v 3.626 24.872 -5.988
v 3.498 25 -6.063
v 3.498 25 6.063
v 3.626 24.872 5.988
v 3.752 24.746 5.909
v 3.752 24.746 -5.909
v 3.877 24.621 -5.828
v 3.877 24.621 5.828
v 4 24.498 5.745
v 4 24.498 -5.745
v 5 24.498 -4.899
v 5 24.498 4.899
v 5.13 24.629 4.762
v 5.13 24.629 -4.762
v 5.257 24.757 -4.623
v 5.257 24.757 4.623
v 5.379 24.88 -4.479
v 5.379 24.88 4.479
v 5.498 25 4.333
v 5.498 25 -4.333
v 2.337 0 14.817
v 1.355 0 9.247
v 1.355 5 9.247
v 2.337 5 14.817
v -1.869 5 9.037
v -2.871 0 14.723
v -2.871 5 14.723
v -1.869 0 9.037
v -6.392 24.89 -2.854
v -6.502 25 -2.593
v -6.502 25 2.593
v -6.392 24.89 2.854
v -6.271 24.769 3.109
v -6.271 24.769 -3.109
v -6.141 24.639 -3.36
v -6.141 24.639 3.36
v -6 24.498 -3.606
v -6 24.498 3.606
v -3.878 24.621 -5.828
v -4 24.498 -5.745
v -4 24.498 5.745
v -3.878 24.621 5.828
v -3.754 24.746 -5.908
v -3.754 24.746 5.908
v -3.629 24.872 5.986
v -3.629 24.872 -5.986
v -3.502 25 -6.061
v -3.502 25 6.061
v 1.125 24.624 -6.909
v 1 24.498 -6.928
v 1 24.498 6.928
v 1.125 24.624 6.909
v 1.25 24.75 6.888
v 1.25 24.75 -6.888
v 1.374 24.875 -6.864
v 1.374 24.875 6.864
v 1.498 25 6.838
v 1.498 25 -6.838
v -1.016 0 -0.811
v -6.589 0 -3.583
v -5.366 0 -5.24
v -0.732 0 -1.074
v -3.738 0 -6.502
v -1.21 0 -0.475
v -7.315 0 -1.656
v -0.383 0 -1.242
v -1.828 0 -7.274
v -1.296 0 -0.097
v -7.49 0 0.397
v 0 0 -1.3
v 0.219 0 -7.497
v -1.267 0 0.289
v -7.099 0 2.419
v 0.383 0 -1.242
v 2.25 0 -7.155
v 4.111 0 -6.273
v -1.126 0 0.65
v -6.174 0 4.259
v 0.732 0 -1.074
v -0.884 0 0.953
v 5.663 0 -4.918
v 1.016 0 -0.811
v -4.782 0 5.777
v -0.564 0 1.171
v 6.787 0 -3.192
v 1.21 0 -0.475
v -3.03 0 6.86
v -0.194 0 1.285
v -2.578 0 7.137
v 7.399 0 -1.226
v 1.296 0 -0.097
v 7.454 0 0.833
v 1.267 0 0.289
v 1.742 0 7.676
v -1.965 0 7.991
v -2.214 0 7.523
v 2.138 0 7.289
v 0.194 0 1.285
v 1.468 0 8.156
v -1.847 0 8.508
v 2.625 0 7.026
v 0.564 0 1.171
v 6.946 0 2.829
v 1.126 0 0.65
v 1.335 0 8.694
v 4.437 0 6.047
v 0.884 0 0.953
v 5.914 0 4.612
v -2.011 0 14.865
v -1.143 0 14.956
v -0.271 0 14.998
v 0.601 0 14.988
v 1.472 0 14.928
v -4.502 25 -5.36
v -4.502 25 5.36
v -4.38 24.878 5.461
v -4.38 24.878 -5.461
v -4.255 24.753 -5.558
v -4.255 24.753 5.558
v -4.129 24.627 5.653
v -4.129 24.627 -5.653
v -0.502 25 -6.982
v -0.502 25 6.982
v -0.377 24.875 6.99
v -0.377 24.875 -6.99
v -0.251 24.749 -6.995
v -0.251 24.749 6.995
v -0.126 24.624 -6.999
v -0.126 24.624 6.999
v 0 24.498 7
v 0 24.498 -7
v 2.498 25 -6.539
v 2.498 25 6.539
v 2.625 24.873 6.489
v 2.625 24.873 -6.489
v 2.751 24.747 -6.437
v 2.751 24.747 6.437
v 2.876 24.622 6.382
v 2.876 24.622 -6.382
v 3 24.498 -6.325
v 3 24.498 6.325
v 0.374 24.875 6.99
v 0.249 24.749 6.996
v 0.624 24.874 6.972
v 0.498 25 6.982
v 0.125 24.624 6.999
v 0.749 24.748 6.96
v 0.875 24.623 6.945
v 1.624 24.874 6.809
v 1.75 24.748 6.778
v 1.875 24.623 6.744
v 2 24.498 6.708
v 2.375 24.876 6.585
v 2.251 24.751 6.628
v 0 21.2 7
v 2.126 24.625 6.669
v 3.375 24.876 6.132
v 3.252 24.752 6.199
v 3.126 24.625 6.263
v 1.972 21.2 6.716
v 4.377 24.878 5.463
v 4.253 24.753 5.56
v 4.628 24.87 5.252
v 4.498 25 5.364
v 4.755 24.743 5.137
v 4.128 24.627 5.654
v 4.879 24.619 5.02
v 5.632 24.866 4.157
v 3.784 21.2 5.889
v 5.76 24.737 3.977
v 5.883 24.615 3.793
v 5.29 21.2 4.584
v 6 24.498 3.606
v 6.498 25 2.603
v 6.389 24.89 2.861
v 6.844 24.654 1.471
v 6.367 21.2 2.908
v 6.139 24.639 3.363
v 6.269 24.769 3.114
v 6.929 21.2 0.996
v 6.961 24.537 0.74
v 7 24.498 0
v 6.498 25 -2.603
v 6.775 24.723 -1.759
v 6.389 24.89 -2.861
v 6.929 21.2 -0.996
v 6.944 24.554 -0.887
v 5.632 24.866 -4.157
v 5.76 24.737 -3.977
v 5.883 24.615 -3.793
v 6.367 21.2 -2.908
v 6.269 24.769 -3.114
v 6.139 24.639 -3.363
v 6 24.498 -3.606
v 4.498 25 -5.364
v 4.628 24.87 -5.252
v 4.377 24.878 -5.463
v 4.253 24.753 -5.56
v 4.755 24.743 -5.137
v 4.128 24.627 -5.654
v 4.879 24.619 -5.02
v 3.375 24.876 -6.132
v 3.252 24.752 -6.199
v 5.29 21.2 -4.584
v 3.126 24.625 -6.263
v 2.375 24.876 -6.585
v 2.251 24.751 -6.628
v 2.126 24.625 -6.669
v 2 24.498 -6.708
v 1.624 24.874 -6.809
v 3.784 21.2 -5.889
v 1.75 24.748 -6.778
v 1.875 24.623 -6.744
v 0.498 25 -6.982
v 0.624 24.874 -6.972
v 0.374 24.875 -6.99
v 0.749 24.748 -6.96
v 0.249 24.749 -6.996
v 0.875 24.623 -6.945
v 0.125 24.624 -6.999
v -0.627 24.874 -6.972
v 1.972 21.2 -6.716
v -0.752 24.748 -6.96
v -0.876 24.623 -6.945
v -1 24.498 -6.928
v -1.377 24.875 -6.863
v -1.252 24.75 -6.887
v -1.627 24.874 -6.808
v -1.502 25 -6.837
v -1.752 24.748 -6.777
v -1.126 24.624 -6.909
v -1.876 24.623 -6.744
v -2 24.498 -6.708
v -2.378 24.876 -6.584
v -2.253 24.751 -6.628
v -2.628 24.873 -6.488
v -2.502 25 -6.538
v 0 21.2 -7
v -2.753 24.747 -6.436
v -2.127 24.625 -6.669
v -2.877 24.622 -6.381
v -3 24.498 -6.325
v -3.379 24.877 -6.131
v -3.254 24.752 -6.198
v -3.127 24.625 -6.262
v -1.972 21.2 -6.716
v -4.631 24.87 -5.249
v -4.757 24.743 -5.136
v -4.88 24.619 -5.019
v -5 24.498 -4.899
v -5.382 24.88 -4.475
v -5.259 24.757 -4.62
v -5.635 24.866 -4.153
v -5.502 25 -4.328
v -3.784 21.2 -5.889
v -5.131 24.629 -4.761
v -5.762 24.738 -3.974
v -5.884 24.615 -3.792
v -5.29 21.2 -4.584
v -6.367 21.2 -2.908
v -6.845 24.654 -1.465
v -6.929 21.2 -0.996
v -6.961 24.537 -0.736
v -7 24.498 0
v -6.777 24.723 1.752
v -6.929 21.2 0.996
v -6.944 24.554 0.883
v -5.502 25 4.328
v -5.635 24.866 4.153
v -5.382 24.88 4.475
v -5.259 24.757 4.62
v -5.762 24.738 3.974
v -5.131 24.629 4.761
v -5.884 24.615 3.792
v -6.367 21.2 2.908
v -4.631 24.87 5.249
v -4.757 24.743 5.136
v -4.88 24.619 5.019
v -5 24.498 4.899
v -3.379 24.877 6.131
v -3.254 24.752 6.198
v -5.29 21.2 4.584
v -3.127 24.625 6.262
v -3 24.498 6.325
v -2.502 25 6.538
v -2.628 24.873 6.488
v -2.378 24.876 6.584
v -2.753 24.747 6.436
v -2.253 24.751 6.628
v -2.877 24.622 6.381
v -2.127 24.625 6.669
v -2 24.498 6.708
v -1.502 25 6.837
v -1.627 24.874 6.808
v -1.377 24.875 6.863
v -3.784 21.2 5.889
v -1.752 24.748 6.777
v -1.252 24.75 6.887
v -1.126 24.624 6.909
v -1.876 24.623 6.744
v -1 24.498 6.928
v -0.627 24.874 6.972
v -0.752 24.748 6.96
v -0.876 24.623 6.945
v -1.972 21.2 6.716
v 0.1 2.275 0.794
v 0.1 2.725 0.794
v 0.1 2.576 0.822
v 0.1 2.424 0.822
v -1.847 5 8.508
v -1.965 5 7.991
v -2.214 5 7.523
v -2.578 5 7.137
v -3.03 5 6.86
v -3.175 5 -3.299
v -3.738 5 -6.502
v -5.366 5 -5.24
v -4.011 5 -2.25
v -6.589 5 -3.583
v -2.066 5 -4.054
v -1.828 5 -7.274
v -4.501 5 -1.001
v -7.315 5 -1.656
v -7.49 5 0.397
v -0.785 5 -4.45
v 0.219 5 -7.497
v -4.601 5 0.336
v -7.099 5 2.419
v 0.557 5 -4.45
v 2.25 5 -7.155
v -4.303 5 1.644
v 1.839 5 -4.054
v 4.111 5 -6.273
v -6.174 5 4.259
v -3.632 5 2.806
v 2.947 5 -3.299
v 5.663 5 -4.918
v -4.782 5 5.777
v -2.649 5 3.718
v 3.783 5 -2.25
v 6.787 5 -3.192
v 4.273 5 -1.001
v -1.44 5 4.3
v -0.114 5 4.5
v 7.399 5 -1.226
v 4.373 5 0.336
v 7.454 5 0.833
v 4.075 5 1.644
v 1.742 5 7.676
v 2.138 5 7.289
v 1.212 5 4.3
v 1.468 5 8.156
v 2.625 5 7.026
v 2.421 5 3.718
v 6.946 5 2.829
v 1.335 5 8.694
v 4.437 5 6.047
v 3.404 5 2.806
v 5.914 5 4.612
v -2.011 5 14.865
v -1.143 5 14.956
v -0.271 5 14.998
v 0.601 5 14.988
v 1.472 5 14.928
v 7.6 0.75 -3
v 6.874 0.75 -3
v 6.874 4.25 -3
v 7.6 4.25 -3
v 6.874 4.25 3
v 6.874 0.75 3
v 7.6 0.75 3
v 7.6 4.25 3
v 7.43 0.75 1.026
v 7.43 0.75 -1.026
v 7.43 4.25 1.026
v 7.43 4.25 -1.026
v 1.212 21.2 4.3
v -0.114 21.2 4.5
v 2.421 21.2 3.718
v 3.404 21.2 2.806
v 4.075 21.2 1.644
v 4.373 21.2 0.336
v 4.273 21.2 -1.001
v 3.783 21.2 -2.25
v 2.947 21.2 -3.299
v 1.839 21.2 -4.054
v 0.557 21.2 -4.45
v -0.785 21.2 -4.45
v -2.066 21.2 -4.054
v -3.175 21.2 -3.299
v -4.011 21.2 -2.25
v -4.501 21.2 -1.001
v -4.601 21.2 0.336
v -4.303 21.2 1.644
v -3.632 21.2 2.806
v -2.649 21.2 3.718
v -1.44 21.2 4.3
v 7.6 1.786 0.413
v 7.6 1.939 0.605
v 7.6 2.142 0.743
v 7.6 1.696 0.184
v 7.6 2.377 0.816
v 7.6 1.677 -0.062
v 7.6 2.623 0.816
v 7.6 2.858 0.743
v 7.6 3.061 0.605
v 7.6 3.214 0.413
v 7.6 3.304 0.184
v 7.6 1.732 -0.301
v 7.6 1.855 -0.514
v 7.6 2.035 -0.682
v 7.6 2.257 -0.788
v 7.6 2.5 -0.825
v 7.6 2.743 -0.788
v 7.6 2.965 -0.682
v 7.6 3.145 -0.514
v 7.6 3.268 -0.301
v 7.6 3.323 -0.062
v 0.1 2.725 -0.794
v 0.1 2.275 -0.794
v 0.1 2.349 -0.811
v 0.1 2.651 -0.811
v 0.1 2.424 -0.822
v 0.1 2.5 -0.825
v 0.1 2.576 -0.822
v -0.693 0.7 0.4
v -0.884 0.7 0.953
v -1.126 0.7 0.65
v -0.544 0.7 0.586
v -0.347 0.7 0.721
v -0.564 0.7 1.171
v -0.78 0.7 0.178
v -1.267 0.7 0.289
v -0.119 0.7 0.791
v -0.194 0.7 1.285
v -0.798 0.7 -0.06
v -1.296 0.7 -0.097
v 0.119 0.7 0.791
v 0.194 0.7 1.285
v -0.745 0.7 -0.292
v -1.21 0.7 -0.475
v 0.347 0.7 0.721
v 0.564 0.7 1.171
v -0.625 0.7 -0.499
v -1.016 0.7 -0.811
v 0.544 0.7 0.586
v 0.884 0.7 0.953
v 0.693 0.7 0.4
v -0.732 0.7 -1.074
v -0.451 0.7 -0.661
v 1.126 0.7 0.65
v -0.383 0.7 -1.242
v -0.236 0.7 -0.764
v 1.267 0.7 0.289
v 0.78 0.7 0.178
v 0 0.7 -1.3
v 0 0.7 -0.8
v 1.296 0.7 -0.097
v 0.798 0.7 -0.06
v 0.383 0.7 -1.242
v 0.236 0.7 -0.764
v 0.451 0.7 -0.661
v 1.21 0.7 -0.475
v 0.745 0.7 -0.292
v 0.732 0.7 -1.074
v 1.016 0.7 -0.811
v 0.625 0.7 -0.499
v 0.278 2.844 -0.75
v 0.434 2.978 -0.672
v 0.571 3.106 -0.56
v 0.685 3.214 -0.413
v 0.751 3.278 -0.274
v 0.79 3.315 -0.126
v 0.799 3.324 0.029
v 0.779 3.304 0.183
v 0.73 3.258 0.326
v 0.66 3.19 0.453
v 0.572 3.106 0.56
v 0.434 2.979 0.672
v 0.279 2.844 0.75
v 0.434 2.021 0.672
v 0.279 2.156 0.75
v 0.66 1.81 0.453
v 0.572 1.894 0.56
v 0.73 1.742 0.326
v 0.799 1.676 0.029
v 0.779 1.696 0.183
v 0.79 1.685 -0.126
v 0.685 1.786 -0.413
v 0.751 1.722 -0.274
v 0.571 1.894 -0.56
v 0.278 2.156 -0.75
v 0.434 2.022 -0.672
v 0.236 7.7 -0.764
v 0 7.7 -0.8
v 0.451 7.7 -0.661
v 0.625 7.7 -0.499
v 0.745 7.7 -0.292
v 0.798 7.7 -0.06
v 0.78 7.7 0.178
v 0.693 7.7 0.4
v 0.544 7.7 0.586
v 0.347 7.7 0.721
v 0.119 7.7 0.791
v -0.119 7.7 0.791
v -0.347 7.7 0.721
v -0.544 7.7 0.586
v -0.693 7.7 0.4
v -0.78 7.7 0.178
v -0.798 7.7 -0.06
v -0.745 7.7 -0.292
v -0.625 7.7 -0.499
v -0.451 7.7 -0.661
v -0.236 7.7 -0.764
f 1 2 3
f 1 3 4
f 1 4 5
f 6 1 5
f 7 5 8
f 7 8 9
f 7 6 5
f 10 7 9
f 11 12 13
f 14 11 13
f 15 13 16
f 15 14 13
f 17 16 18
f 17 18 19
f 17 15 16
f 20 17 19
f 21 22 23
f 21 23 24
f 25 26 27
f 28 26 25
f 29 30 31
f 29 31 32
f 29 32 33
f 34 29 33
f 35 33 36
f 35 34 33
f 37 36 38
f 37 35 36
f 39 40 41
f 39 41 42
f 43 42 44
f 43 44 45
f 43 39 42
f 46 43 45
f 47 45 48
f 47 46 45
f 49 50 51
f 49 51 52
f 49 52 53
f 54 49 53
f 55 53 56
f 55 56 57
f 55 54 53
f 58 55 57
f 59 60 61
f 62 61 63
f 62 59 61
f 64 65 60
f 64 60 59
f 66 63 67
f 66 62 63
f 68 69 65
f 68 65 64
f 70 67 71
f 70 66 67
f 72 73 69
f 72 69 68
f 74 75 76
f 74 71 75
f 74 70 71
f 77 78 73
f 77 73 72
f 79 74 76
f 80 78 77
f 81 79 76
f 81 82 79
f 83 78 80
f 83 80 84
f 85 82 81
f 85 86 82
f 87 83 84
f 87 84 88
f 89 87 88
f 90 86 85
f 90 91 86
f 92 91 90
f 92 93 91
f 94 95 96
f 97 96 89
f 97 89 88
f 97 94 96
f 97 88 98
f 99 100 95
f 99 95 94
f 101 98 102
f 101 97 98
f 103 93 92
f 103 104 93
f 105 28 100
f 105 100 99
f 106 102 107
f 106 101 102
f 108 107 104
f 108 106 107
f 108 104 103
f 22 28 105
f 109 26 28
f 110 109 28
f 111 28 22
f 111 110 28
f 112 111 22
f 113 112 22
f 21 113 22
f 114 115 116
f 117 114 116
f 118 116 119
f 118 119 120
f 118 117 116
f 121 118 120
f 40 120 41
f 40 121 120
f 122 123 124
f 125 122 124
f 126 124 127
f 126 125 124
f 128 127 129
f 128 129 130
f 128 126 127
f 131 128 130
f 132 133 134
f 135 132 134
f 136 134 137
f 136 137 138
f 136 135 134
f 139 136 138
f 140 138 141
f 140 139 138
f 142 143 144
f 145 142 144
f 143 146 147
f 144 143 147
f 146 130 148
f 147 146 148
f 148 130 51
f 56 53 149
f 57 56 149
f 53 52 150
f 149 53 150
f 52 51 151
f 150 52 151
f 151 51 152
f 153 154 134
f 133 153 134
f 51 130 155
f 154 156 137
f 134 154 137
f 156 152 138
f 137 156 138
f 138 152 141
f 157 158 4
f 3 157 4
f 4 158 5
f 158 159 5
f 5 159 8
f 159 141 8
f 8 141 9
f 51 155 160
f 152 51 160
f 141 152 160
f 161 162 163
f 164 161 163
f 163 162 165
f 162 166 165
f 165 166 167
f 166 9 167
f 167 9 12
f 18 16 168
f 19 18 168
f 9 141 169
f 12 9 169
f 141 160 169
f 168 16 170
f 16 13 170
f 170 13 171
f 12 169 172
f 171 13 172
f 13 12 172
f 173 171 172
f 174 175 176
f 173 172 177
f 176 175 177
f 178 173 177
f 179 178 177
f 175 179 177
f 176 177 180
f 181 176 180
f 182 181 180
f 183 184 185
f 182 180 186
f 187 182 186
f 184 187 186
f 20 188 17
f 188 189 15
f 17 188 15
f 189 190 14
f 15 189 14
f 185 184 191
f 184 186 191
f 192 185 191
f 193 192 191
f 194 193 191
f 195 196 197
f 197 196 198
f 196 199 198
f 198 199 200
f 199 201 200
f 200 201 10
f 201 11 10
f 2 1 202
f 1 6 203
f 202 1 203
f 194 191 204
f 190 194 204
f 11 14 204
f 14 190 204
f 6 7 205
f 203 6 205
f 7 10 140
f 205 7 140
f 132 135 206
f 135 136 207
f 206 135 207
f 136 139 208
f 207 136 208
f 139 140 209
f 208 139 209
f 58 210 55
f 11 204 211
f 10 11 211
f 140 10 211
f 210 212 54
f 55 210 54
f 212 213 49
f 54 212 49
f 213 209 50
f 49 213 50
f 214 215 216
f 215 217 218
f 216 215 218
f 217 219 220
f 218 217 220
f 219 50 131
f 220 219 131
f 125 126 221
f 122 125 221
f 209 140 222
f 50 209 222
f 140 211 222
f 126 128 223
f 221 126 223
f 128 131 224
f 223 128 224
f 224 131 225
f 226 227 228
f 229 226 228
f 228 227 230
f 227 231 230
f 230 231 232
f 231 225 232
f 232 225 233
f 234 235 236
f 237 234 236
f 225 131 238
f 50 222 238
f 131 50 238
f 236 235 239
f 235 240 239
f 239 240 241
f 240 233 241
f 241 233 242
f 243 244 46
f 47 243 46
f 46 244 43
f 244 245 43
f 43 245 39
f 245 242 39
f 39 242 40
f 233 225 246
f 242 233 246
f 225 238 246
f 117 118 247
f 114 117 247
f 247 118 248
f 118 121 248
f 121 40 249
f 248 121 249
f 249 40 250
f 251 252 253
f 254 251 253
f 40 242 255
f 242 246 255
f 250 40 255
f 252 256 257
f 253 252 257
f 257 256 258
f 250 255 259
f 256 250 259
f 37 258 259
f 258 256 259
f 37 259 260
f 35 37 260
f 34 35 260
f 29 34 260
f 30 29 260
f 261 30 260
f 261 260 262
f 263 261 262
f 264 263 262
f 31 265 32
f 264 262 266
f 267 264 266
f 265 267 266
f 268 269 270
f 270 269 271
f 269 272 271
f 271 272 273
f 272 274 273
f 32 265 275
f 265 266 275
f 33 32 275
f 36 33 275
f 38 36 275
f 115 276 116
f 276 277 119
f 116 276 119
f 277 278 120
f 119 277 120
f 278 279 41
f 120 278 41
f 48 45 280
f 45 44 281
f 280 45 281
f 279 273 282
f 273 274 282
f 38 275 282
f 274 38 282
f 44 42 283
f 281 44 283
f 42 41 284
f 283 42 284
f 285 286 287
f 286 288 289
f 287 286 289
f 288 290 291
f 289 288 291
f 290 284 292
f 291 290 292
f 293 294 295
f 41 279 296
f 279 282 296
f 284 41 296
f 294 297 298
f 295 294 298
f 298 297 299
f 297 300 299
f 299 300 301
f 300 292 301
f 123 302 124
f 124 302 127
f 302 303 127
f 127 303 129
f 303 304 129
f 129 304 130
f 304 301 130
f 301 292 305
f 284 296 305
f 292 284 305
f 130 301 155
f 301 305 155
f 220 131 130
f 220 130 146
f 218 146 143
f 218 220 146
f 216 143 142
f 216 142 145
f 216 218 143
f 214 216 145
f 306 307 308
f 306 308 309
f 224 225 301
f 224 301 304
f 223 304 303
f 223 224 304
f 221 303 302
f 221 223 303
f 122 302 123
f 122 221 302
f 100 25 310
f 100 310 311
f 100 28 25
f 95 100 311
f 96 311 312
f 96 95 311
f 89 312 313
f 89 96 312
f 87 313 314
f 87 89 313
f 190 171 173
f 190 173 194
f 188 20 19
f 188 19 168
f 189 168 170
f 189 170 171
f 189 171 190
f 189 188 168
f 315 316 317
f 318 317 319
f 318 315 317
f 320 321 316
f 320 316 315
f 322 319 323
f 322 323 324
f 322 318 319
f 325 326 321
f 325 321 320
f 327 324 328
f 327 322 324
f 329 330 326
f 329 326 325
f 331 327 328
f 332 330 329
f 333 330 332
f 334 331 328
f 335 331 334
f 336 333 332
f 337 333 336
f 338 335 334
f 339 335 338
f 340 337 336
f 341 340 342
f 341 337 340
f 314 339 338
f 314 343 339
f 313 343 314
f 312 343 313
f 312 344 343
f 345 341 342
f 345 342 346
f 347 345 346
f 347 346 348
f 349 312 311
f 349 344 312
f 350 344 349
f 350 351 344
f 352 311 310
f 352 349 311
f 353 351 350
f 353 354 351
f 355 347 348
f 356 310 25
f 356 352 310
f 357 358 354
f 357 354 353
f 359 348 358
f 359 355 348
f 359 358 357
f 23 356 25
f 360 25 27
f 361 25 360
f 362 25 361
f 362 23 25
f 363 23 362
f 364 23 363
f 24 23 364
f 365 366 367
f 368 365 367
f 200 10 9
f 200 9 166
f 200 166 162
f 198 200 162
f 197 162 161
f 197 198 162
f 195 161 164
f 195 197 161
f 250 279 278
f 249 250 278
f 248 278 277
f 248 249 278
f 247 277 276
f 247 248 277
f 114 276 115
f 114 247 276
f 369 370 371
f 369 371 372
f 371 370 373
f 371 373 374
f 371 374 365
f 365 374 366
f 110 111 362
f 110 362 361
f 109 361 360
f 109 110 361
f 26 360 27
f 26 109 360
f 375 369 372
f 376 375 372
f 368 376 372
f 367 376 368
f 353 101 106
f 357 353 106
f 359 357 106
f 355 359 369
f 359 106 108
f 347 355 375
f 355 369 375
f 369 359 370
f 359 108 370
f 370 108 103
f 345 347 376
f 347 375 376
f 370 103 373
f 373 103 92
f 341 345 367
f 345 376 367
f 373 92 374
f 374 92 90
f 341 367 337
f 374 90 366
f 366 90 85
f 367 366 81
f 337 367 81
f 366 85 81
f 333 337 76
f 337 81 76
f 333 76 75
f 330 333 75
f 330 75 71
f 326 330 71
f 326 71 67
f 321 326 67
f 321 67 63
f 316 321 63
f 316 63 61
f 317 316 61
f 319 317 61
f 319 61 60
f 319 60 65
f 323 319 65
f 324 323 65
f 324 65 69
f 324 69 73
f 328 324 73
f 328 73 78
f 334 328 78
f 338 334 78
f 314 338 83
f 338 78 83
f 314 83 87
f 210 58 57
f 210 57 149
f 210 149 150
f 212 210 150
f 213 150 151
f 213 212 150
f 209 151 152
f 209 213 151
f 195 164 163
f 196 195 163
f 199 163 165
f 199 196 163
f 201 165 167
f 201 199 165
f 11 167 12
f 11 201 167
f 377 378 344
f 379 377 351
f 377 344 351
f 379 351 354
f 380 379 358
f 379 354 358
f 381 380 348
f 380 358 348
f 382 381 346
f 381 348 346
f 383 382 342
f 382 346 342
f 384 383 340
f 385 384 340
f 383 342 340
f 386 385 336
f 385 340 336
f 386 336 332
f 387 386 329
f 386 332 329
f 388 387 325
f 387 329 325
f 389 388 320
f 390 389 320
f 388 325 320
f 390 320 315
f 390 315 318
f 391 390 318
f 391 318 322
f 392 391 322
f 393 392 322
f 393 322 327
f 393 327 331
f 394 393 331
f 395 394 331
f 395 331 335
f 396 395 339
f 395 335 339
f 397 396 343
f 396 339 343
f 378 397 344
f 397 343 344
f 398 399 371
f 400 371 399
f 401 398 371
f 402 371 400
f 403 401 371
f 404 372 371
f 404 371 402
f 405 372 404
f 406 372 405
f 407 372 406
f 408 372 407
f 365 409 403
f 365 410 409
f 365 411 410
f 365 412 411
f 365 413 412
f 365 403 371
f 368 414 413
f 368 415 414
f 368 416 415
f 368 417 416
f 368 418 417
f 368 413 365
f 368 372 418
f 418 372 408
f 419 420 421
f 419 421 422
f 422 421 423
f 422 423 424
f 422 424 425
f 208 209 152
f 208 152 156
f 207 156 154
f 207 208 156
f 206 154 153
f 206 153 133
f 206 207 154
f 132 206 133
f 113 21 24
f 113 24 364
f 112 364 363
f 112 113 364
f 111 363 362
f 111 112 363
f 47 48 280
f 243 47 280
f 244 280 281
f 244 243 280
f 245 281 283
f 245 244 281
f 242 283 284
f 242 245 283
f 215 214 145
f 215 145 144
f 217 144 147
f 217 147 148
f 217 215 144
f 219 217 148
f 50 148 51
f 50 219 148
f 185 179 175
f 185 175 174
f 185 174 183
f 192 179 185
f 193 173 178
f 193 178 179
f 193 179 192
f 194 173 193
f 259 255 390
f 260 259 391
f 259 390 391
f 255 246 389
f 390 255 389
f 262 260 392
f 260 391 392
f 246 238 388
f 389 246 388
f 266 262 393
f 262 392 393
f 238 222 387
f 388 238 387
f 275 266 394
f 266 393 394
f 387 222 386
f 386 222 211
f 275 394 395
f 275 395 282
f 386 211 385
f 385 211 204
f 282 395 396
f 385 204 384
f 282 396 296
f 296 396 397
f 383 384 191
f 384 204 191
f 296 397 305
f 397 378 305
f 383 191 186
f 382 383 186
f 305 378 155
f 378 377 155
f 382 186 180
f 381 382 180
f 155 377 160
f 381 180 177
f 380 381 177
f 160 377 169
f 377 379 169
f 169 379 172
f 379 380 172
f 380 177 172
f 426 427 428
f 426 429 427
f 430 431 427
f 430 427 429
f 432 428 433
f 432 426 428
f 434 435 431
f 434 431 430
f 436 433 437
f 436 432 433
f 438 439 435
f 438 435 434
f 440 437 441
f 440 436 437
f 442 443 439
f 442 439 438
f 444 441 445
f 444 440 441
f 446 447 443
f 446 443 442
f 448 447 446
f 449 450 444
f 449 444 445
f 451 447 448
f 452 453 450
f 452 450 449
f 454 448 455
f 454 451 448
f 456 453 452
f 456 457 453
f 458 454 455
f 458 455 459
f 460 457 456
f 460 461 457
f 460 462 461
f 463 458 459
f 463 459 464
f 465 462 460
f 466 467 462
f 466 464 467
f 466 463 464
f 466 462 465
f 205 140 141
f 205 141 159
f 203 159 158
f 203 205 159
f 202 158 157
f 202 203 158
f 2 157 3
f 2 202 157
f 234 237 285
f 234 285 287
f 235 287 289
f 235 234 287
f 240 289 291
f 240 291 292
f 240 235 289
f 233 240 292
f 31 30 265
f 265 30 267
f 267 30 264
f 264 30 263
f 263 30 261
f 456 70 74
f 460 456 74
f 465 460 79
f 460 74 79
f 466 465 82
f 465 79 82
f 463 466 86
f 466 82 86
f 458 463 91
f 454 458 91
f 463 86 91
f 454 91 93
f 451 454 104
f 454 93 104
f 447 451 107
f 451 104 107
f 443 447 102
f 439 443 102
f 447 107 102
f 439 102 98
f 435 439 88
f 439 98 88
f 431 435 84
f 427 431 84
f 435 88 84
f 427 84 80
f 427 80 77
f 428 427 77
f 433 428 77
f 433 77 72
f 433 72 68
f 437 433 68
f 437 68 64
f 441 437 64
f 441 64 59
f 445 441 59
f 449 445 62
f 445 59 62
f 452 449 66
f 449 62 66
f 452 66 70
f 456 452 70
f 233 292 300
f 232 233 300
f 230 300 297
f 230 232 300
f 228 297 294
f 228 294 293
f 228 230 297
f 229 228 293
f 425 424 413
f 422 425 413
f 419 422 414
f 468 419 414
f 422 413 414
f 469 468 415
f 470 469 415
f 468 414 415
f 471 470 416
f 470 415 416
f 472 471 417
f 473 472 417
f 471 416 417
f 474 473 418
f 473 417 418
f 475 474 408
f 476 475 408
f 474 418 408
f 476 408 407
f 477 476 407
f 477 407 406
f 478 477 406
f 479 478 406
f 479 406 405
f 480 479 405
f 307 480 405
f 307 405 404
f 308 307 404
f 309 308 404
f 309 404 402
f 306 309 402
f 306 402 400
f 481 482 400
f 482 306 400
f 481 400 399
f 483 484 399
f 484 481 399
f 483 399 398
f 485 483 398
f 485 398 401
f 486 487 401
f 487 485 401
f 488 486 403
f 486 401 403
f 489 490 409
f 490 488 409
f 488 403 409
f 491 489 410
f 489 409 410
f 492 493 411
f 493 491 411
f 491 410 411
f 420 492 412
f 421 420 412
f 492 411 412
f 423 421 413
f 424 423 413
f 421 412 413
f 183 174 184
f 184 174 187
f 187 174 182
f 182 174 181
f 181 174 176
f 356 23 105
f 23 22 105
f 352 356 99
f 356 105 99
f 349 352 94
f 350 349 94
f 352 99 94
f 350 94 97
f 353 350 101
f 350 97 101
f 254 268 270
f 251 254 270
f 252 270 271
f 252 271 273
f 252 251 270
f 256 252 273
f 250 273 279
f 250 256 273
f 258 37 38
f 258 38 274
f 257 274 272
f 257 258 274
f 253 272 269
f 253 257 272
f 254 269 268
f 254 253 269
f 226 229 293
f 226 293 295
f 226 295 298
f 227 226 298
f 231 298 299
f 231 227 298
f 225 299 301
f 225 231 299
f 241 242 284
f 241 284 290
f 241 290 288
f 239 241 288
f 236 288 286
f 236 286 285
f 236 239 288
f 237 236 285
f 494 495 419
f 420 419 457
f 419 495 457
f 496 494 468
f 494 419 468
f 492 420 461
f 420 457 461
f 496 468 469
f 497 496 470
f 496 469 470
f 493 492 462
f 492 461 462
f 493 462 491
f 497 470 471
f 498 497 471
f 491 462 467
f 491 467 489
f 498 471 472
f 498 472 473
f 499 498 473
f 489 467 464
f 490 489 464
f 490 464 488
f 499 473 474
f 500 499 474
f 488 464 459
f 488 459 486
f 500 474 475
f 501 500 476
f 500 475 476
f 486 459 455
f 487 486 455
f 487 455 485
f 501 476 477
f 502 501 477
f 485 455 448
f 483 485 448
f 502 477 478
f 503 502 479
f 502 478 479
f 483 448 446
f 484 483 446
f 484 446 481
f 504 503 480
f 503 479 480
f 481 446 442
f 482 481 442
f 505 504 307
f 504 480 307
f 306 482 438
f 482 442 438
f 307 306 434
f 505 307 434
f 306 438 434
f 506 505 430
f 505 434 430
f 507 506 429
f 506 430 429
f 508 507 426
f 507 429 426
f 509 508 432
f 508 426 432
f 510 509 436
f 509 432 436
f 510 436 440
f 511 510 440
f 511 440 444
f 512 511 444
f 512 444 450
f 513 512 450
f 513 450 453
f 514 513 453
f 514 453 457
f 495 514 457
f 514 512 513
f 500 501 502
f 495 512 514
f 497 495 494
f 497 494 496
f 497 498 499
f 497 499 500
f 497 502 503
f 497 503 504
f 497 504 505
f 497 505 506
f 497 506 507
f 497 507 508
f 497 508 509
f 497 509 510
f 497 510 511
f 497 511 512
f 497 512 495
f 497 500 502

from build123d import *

# Parameters (mm, degrees)
SKETCH1_R                = 7.5
BOSS_EXTRUDE1_DEPTH      = 5
SKETCH2_R                = 7
BOSS_EXTRUDE2_DEPTH      = 20
CUT_EXTRUDE2_DEPTH       = 28.156951228
CUT_EXTRUDE2_DEPTH_BACK  = 28.156951228
SKETCH6_R                = 1.3
CUT_EXTRUDE3_DEPTH       = 0.7
SKETCH9_R                = 0.8
CUT_EXTRUDE4_DEPTH       = 7
BOSS_EXTRUDE3_DEPTH      = 0.1
BOSS_EXTRUDE3_DEPTH_BACK = 1
SKETCH10_W               = 6
SKETCH10_H               = 3.5
SKETCH17_R               = 7.5
SKETCH17_R_2             = 4.5
CUT_EXTRUDE7_DEPTH       = 16.2
BOSS_EXTRUDE6_DEPTH      = 5
FILLET2_R                = 2
SKETCH11_R               = 0.825
CUT_EXTRUDE8_DEPTH       = 7.5


with BuildPart() as part:
    # Sketch1 → Boss-Extrude1 (new body)
    with BuildSketch(Plane(origin=(0, 0, 0), x_dir=(1, 0, 0), z_dir=(0, 1, 0))):
        with Locations(Location((0, 0, 0), (0, 0, 270))):
            Circle(SKETCH1_R)
    extrude(amount=BOSS_EXTRUDE1_DEPTH)

    # Sketch2 → Boss-Extrude2 (add)
    with BuildSketch(Plane(origin=(0, 5, 0), x_dir=(1, 0, 0), z_dir=(0, 1, 0))):
        with Locations(Location((0, 0, 0), (0, 0, 270))):
            Circle(SKETCH2_R)
    extrude(amount=BOSS_EXTRUDE2_DEPTH)

    # Sketch5 → Cut-Extrude2 (cut, two sides: drawn at the far end of the back side and taken through both)
    with BuildSketch(Plane.XY.offset(-CUT_EXTRUDE2_DEPTH_BACK)):
        Polygon((-7.502045815, 25), (-7, 24.497954185), (-6.502045815, 25), (-6, 24.497954185), (-5.502045815, 25), (-5, 24.497954185), (-4.502045815, 25), (-4, 24.497954185), (-3.502045815, 25), (-3, 24.497954185), (-2.502045815, 25), (-2, 24.497954185), (-1.502045815, 25), (-1, 24.497954185), (-0.502045815, 25), (0, 24.497954185), (0.497954185, 25), (1, 24.497954185), (1.497954185, 25), (2, 24.497954185), (2.497954185, 25), (3, 24.497954185), (3.497954185, 25), (4, 24.497954185), (4.497954185, 25), (5, 24.497954185), (5.497954185, 25), (6, 24.497954185), (6.497954185, 25), (7, 24.497954185), (7, 25.505612795), (-7.502045815, 25.505612795), align=None)
    extrude(amount=CUT_EXTRUDE2_DEPTH + CUT_EXTRUDE2_DEPTH_BACK, mode=Mode.SUBTRACT)

    # Sketch6 → Cut-Extrude3 (cut)
    with BuildSketch(Plane.XZ):
        with Locations(Location((0, 0, 0), (0, 0, 270))):
            Circle(SKETCH6_R)
    extrude(amount=-CUT_EXTRUDE3_DEPTH, mode=Mode.SUBTRACT)

    # Sketch9 → Cut-Extrude4 (cut)
    with BuildSketch(Plane.XZ.offset(-0.7)):
        with Locations(Location((0, 0, 0), (0, 0, 270))):
            Circle(SKETCH9_R)
    extrude(amount=-CUT_EXTRUDE4_DEPTH, mode=Mode.SUBTRACT)

    # Sketch10 → Boss-Extrude3 (add, two sides: drawn at the far end of the back side and taken through both)
    with BuildSketch(Plane(origin=(7.5, 0, 0), x_dir=(0, 0, -1), z_dir=(1, 0, 0)).offset(-BOSS_EXTRUDE3_DEPTH_BACK)):
        with Locations((0, 2.5)):
            Rectangle(SKETCH10_W, SKETCH10_H)
    extrude(amount=BOSS_EXTRUDE3_DEPTH + BOSS_EXTRUDE3_DEPTH_BACK)

    # Sketch17 → Cut-Extrude7 (cut)
    with BuildSketch(Plane(origin=(0, 5, 0), x_dir=(1, 0, 0), z_dir=(0, 1, 0))):
        with Locations(Location((0, 0, 0), (0, 0, 270))):
            Circle(SKETCH17_R)
        with Locations(Location((-0.11397387, 0, 0), (0, 0, 270))):
            Circle(SKETCH17_R_2, mode=Mode.SUBTRACT)
    extrude(amount=CUT_EXTRUDE7_DEPTH, mode=Mode.SUBTRACT)

    # Sketch20 → Boss-Extrude6 (add)
    with BuildSketch(Plane.XZ):
        with BuildLine():
            Line((0.70668366, 5.570291045), (2.337095188, 14.816814303))
            ThreePointArc((2.337095188, 14.816814303), (1.03683138, 14.964123118), (-0.271323341, 14.997545921))
            ThreePointArc((-0.271323341, 14.997545921), (-1.577413128, 14.916828343), (-2.871497849, 14.722584695))
            Line((-2.871497849, 14.722584695), (-1.241086321, 5.476061437))
            ThreePointArc((-1.241086321, 5.476061437), (-0.759093411, 5.56339117), (-0.271323341, 5.608380137))
            ThreePointArc((-0.271323341, 5.608380137), (0.218511662, 5.610685945), (0.70668366, 5.570291045))
        make_face()
    extrude(amount=-BOSS_EXTRUDE6_DEPTH)

    # Fillet2
    fillet2_edges = [part.edges().sort_by_distance(p)[0] for p in [
        (1.0343075, 2.5, 7.428338172),
        (-1.568710161, 2.5, 7.334108564),
    ]]
    fillet(fillet2_edges, radius=FILLET2_R)

    # Sketch11 → Cut-Extrude8 (cut)
    with BuildSketch(Plane(origin=(7.6, 0, 0), x_dir=(0, 0, -1), z_dir=(1, 0, 0))):
        with Locations((0, 2.5)):
            Circle(SKETCH11_R)
    extrude(amount=-CUT_EXTRUDE8_DEPTH, mode=Mode.SUBTRACT)


solid = part.part
